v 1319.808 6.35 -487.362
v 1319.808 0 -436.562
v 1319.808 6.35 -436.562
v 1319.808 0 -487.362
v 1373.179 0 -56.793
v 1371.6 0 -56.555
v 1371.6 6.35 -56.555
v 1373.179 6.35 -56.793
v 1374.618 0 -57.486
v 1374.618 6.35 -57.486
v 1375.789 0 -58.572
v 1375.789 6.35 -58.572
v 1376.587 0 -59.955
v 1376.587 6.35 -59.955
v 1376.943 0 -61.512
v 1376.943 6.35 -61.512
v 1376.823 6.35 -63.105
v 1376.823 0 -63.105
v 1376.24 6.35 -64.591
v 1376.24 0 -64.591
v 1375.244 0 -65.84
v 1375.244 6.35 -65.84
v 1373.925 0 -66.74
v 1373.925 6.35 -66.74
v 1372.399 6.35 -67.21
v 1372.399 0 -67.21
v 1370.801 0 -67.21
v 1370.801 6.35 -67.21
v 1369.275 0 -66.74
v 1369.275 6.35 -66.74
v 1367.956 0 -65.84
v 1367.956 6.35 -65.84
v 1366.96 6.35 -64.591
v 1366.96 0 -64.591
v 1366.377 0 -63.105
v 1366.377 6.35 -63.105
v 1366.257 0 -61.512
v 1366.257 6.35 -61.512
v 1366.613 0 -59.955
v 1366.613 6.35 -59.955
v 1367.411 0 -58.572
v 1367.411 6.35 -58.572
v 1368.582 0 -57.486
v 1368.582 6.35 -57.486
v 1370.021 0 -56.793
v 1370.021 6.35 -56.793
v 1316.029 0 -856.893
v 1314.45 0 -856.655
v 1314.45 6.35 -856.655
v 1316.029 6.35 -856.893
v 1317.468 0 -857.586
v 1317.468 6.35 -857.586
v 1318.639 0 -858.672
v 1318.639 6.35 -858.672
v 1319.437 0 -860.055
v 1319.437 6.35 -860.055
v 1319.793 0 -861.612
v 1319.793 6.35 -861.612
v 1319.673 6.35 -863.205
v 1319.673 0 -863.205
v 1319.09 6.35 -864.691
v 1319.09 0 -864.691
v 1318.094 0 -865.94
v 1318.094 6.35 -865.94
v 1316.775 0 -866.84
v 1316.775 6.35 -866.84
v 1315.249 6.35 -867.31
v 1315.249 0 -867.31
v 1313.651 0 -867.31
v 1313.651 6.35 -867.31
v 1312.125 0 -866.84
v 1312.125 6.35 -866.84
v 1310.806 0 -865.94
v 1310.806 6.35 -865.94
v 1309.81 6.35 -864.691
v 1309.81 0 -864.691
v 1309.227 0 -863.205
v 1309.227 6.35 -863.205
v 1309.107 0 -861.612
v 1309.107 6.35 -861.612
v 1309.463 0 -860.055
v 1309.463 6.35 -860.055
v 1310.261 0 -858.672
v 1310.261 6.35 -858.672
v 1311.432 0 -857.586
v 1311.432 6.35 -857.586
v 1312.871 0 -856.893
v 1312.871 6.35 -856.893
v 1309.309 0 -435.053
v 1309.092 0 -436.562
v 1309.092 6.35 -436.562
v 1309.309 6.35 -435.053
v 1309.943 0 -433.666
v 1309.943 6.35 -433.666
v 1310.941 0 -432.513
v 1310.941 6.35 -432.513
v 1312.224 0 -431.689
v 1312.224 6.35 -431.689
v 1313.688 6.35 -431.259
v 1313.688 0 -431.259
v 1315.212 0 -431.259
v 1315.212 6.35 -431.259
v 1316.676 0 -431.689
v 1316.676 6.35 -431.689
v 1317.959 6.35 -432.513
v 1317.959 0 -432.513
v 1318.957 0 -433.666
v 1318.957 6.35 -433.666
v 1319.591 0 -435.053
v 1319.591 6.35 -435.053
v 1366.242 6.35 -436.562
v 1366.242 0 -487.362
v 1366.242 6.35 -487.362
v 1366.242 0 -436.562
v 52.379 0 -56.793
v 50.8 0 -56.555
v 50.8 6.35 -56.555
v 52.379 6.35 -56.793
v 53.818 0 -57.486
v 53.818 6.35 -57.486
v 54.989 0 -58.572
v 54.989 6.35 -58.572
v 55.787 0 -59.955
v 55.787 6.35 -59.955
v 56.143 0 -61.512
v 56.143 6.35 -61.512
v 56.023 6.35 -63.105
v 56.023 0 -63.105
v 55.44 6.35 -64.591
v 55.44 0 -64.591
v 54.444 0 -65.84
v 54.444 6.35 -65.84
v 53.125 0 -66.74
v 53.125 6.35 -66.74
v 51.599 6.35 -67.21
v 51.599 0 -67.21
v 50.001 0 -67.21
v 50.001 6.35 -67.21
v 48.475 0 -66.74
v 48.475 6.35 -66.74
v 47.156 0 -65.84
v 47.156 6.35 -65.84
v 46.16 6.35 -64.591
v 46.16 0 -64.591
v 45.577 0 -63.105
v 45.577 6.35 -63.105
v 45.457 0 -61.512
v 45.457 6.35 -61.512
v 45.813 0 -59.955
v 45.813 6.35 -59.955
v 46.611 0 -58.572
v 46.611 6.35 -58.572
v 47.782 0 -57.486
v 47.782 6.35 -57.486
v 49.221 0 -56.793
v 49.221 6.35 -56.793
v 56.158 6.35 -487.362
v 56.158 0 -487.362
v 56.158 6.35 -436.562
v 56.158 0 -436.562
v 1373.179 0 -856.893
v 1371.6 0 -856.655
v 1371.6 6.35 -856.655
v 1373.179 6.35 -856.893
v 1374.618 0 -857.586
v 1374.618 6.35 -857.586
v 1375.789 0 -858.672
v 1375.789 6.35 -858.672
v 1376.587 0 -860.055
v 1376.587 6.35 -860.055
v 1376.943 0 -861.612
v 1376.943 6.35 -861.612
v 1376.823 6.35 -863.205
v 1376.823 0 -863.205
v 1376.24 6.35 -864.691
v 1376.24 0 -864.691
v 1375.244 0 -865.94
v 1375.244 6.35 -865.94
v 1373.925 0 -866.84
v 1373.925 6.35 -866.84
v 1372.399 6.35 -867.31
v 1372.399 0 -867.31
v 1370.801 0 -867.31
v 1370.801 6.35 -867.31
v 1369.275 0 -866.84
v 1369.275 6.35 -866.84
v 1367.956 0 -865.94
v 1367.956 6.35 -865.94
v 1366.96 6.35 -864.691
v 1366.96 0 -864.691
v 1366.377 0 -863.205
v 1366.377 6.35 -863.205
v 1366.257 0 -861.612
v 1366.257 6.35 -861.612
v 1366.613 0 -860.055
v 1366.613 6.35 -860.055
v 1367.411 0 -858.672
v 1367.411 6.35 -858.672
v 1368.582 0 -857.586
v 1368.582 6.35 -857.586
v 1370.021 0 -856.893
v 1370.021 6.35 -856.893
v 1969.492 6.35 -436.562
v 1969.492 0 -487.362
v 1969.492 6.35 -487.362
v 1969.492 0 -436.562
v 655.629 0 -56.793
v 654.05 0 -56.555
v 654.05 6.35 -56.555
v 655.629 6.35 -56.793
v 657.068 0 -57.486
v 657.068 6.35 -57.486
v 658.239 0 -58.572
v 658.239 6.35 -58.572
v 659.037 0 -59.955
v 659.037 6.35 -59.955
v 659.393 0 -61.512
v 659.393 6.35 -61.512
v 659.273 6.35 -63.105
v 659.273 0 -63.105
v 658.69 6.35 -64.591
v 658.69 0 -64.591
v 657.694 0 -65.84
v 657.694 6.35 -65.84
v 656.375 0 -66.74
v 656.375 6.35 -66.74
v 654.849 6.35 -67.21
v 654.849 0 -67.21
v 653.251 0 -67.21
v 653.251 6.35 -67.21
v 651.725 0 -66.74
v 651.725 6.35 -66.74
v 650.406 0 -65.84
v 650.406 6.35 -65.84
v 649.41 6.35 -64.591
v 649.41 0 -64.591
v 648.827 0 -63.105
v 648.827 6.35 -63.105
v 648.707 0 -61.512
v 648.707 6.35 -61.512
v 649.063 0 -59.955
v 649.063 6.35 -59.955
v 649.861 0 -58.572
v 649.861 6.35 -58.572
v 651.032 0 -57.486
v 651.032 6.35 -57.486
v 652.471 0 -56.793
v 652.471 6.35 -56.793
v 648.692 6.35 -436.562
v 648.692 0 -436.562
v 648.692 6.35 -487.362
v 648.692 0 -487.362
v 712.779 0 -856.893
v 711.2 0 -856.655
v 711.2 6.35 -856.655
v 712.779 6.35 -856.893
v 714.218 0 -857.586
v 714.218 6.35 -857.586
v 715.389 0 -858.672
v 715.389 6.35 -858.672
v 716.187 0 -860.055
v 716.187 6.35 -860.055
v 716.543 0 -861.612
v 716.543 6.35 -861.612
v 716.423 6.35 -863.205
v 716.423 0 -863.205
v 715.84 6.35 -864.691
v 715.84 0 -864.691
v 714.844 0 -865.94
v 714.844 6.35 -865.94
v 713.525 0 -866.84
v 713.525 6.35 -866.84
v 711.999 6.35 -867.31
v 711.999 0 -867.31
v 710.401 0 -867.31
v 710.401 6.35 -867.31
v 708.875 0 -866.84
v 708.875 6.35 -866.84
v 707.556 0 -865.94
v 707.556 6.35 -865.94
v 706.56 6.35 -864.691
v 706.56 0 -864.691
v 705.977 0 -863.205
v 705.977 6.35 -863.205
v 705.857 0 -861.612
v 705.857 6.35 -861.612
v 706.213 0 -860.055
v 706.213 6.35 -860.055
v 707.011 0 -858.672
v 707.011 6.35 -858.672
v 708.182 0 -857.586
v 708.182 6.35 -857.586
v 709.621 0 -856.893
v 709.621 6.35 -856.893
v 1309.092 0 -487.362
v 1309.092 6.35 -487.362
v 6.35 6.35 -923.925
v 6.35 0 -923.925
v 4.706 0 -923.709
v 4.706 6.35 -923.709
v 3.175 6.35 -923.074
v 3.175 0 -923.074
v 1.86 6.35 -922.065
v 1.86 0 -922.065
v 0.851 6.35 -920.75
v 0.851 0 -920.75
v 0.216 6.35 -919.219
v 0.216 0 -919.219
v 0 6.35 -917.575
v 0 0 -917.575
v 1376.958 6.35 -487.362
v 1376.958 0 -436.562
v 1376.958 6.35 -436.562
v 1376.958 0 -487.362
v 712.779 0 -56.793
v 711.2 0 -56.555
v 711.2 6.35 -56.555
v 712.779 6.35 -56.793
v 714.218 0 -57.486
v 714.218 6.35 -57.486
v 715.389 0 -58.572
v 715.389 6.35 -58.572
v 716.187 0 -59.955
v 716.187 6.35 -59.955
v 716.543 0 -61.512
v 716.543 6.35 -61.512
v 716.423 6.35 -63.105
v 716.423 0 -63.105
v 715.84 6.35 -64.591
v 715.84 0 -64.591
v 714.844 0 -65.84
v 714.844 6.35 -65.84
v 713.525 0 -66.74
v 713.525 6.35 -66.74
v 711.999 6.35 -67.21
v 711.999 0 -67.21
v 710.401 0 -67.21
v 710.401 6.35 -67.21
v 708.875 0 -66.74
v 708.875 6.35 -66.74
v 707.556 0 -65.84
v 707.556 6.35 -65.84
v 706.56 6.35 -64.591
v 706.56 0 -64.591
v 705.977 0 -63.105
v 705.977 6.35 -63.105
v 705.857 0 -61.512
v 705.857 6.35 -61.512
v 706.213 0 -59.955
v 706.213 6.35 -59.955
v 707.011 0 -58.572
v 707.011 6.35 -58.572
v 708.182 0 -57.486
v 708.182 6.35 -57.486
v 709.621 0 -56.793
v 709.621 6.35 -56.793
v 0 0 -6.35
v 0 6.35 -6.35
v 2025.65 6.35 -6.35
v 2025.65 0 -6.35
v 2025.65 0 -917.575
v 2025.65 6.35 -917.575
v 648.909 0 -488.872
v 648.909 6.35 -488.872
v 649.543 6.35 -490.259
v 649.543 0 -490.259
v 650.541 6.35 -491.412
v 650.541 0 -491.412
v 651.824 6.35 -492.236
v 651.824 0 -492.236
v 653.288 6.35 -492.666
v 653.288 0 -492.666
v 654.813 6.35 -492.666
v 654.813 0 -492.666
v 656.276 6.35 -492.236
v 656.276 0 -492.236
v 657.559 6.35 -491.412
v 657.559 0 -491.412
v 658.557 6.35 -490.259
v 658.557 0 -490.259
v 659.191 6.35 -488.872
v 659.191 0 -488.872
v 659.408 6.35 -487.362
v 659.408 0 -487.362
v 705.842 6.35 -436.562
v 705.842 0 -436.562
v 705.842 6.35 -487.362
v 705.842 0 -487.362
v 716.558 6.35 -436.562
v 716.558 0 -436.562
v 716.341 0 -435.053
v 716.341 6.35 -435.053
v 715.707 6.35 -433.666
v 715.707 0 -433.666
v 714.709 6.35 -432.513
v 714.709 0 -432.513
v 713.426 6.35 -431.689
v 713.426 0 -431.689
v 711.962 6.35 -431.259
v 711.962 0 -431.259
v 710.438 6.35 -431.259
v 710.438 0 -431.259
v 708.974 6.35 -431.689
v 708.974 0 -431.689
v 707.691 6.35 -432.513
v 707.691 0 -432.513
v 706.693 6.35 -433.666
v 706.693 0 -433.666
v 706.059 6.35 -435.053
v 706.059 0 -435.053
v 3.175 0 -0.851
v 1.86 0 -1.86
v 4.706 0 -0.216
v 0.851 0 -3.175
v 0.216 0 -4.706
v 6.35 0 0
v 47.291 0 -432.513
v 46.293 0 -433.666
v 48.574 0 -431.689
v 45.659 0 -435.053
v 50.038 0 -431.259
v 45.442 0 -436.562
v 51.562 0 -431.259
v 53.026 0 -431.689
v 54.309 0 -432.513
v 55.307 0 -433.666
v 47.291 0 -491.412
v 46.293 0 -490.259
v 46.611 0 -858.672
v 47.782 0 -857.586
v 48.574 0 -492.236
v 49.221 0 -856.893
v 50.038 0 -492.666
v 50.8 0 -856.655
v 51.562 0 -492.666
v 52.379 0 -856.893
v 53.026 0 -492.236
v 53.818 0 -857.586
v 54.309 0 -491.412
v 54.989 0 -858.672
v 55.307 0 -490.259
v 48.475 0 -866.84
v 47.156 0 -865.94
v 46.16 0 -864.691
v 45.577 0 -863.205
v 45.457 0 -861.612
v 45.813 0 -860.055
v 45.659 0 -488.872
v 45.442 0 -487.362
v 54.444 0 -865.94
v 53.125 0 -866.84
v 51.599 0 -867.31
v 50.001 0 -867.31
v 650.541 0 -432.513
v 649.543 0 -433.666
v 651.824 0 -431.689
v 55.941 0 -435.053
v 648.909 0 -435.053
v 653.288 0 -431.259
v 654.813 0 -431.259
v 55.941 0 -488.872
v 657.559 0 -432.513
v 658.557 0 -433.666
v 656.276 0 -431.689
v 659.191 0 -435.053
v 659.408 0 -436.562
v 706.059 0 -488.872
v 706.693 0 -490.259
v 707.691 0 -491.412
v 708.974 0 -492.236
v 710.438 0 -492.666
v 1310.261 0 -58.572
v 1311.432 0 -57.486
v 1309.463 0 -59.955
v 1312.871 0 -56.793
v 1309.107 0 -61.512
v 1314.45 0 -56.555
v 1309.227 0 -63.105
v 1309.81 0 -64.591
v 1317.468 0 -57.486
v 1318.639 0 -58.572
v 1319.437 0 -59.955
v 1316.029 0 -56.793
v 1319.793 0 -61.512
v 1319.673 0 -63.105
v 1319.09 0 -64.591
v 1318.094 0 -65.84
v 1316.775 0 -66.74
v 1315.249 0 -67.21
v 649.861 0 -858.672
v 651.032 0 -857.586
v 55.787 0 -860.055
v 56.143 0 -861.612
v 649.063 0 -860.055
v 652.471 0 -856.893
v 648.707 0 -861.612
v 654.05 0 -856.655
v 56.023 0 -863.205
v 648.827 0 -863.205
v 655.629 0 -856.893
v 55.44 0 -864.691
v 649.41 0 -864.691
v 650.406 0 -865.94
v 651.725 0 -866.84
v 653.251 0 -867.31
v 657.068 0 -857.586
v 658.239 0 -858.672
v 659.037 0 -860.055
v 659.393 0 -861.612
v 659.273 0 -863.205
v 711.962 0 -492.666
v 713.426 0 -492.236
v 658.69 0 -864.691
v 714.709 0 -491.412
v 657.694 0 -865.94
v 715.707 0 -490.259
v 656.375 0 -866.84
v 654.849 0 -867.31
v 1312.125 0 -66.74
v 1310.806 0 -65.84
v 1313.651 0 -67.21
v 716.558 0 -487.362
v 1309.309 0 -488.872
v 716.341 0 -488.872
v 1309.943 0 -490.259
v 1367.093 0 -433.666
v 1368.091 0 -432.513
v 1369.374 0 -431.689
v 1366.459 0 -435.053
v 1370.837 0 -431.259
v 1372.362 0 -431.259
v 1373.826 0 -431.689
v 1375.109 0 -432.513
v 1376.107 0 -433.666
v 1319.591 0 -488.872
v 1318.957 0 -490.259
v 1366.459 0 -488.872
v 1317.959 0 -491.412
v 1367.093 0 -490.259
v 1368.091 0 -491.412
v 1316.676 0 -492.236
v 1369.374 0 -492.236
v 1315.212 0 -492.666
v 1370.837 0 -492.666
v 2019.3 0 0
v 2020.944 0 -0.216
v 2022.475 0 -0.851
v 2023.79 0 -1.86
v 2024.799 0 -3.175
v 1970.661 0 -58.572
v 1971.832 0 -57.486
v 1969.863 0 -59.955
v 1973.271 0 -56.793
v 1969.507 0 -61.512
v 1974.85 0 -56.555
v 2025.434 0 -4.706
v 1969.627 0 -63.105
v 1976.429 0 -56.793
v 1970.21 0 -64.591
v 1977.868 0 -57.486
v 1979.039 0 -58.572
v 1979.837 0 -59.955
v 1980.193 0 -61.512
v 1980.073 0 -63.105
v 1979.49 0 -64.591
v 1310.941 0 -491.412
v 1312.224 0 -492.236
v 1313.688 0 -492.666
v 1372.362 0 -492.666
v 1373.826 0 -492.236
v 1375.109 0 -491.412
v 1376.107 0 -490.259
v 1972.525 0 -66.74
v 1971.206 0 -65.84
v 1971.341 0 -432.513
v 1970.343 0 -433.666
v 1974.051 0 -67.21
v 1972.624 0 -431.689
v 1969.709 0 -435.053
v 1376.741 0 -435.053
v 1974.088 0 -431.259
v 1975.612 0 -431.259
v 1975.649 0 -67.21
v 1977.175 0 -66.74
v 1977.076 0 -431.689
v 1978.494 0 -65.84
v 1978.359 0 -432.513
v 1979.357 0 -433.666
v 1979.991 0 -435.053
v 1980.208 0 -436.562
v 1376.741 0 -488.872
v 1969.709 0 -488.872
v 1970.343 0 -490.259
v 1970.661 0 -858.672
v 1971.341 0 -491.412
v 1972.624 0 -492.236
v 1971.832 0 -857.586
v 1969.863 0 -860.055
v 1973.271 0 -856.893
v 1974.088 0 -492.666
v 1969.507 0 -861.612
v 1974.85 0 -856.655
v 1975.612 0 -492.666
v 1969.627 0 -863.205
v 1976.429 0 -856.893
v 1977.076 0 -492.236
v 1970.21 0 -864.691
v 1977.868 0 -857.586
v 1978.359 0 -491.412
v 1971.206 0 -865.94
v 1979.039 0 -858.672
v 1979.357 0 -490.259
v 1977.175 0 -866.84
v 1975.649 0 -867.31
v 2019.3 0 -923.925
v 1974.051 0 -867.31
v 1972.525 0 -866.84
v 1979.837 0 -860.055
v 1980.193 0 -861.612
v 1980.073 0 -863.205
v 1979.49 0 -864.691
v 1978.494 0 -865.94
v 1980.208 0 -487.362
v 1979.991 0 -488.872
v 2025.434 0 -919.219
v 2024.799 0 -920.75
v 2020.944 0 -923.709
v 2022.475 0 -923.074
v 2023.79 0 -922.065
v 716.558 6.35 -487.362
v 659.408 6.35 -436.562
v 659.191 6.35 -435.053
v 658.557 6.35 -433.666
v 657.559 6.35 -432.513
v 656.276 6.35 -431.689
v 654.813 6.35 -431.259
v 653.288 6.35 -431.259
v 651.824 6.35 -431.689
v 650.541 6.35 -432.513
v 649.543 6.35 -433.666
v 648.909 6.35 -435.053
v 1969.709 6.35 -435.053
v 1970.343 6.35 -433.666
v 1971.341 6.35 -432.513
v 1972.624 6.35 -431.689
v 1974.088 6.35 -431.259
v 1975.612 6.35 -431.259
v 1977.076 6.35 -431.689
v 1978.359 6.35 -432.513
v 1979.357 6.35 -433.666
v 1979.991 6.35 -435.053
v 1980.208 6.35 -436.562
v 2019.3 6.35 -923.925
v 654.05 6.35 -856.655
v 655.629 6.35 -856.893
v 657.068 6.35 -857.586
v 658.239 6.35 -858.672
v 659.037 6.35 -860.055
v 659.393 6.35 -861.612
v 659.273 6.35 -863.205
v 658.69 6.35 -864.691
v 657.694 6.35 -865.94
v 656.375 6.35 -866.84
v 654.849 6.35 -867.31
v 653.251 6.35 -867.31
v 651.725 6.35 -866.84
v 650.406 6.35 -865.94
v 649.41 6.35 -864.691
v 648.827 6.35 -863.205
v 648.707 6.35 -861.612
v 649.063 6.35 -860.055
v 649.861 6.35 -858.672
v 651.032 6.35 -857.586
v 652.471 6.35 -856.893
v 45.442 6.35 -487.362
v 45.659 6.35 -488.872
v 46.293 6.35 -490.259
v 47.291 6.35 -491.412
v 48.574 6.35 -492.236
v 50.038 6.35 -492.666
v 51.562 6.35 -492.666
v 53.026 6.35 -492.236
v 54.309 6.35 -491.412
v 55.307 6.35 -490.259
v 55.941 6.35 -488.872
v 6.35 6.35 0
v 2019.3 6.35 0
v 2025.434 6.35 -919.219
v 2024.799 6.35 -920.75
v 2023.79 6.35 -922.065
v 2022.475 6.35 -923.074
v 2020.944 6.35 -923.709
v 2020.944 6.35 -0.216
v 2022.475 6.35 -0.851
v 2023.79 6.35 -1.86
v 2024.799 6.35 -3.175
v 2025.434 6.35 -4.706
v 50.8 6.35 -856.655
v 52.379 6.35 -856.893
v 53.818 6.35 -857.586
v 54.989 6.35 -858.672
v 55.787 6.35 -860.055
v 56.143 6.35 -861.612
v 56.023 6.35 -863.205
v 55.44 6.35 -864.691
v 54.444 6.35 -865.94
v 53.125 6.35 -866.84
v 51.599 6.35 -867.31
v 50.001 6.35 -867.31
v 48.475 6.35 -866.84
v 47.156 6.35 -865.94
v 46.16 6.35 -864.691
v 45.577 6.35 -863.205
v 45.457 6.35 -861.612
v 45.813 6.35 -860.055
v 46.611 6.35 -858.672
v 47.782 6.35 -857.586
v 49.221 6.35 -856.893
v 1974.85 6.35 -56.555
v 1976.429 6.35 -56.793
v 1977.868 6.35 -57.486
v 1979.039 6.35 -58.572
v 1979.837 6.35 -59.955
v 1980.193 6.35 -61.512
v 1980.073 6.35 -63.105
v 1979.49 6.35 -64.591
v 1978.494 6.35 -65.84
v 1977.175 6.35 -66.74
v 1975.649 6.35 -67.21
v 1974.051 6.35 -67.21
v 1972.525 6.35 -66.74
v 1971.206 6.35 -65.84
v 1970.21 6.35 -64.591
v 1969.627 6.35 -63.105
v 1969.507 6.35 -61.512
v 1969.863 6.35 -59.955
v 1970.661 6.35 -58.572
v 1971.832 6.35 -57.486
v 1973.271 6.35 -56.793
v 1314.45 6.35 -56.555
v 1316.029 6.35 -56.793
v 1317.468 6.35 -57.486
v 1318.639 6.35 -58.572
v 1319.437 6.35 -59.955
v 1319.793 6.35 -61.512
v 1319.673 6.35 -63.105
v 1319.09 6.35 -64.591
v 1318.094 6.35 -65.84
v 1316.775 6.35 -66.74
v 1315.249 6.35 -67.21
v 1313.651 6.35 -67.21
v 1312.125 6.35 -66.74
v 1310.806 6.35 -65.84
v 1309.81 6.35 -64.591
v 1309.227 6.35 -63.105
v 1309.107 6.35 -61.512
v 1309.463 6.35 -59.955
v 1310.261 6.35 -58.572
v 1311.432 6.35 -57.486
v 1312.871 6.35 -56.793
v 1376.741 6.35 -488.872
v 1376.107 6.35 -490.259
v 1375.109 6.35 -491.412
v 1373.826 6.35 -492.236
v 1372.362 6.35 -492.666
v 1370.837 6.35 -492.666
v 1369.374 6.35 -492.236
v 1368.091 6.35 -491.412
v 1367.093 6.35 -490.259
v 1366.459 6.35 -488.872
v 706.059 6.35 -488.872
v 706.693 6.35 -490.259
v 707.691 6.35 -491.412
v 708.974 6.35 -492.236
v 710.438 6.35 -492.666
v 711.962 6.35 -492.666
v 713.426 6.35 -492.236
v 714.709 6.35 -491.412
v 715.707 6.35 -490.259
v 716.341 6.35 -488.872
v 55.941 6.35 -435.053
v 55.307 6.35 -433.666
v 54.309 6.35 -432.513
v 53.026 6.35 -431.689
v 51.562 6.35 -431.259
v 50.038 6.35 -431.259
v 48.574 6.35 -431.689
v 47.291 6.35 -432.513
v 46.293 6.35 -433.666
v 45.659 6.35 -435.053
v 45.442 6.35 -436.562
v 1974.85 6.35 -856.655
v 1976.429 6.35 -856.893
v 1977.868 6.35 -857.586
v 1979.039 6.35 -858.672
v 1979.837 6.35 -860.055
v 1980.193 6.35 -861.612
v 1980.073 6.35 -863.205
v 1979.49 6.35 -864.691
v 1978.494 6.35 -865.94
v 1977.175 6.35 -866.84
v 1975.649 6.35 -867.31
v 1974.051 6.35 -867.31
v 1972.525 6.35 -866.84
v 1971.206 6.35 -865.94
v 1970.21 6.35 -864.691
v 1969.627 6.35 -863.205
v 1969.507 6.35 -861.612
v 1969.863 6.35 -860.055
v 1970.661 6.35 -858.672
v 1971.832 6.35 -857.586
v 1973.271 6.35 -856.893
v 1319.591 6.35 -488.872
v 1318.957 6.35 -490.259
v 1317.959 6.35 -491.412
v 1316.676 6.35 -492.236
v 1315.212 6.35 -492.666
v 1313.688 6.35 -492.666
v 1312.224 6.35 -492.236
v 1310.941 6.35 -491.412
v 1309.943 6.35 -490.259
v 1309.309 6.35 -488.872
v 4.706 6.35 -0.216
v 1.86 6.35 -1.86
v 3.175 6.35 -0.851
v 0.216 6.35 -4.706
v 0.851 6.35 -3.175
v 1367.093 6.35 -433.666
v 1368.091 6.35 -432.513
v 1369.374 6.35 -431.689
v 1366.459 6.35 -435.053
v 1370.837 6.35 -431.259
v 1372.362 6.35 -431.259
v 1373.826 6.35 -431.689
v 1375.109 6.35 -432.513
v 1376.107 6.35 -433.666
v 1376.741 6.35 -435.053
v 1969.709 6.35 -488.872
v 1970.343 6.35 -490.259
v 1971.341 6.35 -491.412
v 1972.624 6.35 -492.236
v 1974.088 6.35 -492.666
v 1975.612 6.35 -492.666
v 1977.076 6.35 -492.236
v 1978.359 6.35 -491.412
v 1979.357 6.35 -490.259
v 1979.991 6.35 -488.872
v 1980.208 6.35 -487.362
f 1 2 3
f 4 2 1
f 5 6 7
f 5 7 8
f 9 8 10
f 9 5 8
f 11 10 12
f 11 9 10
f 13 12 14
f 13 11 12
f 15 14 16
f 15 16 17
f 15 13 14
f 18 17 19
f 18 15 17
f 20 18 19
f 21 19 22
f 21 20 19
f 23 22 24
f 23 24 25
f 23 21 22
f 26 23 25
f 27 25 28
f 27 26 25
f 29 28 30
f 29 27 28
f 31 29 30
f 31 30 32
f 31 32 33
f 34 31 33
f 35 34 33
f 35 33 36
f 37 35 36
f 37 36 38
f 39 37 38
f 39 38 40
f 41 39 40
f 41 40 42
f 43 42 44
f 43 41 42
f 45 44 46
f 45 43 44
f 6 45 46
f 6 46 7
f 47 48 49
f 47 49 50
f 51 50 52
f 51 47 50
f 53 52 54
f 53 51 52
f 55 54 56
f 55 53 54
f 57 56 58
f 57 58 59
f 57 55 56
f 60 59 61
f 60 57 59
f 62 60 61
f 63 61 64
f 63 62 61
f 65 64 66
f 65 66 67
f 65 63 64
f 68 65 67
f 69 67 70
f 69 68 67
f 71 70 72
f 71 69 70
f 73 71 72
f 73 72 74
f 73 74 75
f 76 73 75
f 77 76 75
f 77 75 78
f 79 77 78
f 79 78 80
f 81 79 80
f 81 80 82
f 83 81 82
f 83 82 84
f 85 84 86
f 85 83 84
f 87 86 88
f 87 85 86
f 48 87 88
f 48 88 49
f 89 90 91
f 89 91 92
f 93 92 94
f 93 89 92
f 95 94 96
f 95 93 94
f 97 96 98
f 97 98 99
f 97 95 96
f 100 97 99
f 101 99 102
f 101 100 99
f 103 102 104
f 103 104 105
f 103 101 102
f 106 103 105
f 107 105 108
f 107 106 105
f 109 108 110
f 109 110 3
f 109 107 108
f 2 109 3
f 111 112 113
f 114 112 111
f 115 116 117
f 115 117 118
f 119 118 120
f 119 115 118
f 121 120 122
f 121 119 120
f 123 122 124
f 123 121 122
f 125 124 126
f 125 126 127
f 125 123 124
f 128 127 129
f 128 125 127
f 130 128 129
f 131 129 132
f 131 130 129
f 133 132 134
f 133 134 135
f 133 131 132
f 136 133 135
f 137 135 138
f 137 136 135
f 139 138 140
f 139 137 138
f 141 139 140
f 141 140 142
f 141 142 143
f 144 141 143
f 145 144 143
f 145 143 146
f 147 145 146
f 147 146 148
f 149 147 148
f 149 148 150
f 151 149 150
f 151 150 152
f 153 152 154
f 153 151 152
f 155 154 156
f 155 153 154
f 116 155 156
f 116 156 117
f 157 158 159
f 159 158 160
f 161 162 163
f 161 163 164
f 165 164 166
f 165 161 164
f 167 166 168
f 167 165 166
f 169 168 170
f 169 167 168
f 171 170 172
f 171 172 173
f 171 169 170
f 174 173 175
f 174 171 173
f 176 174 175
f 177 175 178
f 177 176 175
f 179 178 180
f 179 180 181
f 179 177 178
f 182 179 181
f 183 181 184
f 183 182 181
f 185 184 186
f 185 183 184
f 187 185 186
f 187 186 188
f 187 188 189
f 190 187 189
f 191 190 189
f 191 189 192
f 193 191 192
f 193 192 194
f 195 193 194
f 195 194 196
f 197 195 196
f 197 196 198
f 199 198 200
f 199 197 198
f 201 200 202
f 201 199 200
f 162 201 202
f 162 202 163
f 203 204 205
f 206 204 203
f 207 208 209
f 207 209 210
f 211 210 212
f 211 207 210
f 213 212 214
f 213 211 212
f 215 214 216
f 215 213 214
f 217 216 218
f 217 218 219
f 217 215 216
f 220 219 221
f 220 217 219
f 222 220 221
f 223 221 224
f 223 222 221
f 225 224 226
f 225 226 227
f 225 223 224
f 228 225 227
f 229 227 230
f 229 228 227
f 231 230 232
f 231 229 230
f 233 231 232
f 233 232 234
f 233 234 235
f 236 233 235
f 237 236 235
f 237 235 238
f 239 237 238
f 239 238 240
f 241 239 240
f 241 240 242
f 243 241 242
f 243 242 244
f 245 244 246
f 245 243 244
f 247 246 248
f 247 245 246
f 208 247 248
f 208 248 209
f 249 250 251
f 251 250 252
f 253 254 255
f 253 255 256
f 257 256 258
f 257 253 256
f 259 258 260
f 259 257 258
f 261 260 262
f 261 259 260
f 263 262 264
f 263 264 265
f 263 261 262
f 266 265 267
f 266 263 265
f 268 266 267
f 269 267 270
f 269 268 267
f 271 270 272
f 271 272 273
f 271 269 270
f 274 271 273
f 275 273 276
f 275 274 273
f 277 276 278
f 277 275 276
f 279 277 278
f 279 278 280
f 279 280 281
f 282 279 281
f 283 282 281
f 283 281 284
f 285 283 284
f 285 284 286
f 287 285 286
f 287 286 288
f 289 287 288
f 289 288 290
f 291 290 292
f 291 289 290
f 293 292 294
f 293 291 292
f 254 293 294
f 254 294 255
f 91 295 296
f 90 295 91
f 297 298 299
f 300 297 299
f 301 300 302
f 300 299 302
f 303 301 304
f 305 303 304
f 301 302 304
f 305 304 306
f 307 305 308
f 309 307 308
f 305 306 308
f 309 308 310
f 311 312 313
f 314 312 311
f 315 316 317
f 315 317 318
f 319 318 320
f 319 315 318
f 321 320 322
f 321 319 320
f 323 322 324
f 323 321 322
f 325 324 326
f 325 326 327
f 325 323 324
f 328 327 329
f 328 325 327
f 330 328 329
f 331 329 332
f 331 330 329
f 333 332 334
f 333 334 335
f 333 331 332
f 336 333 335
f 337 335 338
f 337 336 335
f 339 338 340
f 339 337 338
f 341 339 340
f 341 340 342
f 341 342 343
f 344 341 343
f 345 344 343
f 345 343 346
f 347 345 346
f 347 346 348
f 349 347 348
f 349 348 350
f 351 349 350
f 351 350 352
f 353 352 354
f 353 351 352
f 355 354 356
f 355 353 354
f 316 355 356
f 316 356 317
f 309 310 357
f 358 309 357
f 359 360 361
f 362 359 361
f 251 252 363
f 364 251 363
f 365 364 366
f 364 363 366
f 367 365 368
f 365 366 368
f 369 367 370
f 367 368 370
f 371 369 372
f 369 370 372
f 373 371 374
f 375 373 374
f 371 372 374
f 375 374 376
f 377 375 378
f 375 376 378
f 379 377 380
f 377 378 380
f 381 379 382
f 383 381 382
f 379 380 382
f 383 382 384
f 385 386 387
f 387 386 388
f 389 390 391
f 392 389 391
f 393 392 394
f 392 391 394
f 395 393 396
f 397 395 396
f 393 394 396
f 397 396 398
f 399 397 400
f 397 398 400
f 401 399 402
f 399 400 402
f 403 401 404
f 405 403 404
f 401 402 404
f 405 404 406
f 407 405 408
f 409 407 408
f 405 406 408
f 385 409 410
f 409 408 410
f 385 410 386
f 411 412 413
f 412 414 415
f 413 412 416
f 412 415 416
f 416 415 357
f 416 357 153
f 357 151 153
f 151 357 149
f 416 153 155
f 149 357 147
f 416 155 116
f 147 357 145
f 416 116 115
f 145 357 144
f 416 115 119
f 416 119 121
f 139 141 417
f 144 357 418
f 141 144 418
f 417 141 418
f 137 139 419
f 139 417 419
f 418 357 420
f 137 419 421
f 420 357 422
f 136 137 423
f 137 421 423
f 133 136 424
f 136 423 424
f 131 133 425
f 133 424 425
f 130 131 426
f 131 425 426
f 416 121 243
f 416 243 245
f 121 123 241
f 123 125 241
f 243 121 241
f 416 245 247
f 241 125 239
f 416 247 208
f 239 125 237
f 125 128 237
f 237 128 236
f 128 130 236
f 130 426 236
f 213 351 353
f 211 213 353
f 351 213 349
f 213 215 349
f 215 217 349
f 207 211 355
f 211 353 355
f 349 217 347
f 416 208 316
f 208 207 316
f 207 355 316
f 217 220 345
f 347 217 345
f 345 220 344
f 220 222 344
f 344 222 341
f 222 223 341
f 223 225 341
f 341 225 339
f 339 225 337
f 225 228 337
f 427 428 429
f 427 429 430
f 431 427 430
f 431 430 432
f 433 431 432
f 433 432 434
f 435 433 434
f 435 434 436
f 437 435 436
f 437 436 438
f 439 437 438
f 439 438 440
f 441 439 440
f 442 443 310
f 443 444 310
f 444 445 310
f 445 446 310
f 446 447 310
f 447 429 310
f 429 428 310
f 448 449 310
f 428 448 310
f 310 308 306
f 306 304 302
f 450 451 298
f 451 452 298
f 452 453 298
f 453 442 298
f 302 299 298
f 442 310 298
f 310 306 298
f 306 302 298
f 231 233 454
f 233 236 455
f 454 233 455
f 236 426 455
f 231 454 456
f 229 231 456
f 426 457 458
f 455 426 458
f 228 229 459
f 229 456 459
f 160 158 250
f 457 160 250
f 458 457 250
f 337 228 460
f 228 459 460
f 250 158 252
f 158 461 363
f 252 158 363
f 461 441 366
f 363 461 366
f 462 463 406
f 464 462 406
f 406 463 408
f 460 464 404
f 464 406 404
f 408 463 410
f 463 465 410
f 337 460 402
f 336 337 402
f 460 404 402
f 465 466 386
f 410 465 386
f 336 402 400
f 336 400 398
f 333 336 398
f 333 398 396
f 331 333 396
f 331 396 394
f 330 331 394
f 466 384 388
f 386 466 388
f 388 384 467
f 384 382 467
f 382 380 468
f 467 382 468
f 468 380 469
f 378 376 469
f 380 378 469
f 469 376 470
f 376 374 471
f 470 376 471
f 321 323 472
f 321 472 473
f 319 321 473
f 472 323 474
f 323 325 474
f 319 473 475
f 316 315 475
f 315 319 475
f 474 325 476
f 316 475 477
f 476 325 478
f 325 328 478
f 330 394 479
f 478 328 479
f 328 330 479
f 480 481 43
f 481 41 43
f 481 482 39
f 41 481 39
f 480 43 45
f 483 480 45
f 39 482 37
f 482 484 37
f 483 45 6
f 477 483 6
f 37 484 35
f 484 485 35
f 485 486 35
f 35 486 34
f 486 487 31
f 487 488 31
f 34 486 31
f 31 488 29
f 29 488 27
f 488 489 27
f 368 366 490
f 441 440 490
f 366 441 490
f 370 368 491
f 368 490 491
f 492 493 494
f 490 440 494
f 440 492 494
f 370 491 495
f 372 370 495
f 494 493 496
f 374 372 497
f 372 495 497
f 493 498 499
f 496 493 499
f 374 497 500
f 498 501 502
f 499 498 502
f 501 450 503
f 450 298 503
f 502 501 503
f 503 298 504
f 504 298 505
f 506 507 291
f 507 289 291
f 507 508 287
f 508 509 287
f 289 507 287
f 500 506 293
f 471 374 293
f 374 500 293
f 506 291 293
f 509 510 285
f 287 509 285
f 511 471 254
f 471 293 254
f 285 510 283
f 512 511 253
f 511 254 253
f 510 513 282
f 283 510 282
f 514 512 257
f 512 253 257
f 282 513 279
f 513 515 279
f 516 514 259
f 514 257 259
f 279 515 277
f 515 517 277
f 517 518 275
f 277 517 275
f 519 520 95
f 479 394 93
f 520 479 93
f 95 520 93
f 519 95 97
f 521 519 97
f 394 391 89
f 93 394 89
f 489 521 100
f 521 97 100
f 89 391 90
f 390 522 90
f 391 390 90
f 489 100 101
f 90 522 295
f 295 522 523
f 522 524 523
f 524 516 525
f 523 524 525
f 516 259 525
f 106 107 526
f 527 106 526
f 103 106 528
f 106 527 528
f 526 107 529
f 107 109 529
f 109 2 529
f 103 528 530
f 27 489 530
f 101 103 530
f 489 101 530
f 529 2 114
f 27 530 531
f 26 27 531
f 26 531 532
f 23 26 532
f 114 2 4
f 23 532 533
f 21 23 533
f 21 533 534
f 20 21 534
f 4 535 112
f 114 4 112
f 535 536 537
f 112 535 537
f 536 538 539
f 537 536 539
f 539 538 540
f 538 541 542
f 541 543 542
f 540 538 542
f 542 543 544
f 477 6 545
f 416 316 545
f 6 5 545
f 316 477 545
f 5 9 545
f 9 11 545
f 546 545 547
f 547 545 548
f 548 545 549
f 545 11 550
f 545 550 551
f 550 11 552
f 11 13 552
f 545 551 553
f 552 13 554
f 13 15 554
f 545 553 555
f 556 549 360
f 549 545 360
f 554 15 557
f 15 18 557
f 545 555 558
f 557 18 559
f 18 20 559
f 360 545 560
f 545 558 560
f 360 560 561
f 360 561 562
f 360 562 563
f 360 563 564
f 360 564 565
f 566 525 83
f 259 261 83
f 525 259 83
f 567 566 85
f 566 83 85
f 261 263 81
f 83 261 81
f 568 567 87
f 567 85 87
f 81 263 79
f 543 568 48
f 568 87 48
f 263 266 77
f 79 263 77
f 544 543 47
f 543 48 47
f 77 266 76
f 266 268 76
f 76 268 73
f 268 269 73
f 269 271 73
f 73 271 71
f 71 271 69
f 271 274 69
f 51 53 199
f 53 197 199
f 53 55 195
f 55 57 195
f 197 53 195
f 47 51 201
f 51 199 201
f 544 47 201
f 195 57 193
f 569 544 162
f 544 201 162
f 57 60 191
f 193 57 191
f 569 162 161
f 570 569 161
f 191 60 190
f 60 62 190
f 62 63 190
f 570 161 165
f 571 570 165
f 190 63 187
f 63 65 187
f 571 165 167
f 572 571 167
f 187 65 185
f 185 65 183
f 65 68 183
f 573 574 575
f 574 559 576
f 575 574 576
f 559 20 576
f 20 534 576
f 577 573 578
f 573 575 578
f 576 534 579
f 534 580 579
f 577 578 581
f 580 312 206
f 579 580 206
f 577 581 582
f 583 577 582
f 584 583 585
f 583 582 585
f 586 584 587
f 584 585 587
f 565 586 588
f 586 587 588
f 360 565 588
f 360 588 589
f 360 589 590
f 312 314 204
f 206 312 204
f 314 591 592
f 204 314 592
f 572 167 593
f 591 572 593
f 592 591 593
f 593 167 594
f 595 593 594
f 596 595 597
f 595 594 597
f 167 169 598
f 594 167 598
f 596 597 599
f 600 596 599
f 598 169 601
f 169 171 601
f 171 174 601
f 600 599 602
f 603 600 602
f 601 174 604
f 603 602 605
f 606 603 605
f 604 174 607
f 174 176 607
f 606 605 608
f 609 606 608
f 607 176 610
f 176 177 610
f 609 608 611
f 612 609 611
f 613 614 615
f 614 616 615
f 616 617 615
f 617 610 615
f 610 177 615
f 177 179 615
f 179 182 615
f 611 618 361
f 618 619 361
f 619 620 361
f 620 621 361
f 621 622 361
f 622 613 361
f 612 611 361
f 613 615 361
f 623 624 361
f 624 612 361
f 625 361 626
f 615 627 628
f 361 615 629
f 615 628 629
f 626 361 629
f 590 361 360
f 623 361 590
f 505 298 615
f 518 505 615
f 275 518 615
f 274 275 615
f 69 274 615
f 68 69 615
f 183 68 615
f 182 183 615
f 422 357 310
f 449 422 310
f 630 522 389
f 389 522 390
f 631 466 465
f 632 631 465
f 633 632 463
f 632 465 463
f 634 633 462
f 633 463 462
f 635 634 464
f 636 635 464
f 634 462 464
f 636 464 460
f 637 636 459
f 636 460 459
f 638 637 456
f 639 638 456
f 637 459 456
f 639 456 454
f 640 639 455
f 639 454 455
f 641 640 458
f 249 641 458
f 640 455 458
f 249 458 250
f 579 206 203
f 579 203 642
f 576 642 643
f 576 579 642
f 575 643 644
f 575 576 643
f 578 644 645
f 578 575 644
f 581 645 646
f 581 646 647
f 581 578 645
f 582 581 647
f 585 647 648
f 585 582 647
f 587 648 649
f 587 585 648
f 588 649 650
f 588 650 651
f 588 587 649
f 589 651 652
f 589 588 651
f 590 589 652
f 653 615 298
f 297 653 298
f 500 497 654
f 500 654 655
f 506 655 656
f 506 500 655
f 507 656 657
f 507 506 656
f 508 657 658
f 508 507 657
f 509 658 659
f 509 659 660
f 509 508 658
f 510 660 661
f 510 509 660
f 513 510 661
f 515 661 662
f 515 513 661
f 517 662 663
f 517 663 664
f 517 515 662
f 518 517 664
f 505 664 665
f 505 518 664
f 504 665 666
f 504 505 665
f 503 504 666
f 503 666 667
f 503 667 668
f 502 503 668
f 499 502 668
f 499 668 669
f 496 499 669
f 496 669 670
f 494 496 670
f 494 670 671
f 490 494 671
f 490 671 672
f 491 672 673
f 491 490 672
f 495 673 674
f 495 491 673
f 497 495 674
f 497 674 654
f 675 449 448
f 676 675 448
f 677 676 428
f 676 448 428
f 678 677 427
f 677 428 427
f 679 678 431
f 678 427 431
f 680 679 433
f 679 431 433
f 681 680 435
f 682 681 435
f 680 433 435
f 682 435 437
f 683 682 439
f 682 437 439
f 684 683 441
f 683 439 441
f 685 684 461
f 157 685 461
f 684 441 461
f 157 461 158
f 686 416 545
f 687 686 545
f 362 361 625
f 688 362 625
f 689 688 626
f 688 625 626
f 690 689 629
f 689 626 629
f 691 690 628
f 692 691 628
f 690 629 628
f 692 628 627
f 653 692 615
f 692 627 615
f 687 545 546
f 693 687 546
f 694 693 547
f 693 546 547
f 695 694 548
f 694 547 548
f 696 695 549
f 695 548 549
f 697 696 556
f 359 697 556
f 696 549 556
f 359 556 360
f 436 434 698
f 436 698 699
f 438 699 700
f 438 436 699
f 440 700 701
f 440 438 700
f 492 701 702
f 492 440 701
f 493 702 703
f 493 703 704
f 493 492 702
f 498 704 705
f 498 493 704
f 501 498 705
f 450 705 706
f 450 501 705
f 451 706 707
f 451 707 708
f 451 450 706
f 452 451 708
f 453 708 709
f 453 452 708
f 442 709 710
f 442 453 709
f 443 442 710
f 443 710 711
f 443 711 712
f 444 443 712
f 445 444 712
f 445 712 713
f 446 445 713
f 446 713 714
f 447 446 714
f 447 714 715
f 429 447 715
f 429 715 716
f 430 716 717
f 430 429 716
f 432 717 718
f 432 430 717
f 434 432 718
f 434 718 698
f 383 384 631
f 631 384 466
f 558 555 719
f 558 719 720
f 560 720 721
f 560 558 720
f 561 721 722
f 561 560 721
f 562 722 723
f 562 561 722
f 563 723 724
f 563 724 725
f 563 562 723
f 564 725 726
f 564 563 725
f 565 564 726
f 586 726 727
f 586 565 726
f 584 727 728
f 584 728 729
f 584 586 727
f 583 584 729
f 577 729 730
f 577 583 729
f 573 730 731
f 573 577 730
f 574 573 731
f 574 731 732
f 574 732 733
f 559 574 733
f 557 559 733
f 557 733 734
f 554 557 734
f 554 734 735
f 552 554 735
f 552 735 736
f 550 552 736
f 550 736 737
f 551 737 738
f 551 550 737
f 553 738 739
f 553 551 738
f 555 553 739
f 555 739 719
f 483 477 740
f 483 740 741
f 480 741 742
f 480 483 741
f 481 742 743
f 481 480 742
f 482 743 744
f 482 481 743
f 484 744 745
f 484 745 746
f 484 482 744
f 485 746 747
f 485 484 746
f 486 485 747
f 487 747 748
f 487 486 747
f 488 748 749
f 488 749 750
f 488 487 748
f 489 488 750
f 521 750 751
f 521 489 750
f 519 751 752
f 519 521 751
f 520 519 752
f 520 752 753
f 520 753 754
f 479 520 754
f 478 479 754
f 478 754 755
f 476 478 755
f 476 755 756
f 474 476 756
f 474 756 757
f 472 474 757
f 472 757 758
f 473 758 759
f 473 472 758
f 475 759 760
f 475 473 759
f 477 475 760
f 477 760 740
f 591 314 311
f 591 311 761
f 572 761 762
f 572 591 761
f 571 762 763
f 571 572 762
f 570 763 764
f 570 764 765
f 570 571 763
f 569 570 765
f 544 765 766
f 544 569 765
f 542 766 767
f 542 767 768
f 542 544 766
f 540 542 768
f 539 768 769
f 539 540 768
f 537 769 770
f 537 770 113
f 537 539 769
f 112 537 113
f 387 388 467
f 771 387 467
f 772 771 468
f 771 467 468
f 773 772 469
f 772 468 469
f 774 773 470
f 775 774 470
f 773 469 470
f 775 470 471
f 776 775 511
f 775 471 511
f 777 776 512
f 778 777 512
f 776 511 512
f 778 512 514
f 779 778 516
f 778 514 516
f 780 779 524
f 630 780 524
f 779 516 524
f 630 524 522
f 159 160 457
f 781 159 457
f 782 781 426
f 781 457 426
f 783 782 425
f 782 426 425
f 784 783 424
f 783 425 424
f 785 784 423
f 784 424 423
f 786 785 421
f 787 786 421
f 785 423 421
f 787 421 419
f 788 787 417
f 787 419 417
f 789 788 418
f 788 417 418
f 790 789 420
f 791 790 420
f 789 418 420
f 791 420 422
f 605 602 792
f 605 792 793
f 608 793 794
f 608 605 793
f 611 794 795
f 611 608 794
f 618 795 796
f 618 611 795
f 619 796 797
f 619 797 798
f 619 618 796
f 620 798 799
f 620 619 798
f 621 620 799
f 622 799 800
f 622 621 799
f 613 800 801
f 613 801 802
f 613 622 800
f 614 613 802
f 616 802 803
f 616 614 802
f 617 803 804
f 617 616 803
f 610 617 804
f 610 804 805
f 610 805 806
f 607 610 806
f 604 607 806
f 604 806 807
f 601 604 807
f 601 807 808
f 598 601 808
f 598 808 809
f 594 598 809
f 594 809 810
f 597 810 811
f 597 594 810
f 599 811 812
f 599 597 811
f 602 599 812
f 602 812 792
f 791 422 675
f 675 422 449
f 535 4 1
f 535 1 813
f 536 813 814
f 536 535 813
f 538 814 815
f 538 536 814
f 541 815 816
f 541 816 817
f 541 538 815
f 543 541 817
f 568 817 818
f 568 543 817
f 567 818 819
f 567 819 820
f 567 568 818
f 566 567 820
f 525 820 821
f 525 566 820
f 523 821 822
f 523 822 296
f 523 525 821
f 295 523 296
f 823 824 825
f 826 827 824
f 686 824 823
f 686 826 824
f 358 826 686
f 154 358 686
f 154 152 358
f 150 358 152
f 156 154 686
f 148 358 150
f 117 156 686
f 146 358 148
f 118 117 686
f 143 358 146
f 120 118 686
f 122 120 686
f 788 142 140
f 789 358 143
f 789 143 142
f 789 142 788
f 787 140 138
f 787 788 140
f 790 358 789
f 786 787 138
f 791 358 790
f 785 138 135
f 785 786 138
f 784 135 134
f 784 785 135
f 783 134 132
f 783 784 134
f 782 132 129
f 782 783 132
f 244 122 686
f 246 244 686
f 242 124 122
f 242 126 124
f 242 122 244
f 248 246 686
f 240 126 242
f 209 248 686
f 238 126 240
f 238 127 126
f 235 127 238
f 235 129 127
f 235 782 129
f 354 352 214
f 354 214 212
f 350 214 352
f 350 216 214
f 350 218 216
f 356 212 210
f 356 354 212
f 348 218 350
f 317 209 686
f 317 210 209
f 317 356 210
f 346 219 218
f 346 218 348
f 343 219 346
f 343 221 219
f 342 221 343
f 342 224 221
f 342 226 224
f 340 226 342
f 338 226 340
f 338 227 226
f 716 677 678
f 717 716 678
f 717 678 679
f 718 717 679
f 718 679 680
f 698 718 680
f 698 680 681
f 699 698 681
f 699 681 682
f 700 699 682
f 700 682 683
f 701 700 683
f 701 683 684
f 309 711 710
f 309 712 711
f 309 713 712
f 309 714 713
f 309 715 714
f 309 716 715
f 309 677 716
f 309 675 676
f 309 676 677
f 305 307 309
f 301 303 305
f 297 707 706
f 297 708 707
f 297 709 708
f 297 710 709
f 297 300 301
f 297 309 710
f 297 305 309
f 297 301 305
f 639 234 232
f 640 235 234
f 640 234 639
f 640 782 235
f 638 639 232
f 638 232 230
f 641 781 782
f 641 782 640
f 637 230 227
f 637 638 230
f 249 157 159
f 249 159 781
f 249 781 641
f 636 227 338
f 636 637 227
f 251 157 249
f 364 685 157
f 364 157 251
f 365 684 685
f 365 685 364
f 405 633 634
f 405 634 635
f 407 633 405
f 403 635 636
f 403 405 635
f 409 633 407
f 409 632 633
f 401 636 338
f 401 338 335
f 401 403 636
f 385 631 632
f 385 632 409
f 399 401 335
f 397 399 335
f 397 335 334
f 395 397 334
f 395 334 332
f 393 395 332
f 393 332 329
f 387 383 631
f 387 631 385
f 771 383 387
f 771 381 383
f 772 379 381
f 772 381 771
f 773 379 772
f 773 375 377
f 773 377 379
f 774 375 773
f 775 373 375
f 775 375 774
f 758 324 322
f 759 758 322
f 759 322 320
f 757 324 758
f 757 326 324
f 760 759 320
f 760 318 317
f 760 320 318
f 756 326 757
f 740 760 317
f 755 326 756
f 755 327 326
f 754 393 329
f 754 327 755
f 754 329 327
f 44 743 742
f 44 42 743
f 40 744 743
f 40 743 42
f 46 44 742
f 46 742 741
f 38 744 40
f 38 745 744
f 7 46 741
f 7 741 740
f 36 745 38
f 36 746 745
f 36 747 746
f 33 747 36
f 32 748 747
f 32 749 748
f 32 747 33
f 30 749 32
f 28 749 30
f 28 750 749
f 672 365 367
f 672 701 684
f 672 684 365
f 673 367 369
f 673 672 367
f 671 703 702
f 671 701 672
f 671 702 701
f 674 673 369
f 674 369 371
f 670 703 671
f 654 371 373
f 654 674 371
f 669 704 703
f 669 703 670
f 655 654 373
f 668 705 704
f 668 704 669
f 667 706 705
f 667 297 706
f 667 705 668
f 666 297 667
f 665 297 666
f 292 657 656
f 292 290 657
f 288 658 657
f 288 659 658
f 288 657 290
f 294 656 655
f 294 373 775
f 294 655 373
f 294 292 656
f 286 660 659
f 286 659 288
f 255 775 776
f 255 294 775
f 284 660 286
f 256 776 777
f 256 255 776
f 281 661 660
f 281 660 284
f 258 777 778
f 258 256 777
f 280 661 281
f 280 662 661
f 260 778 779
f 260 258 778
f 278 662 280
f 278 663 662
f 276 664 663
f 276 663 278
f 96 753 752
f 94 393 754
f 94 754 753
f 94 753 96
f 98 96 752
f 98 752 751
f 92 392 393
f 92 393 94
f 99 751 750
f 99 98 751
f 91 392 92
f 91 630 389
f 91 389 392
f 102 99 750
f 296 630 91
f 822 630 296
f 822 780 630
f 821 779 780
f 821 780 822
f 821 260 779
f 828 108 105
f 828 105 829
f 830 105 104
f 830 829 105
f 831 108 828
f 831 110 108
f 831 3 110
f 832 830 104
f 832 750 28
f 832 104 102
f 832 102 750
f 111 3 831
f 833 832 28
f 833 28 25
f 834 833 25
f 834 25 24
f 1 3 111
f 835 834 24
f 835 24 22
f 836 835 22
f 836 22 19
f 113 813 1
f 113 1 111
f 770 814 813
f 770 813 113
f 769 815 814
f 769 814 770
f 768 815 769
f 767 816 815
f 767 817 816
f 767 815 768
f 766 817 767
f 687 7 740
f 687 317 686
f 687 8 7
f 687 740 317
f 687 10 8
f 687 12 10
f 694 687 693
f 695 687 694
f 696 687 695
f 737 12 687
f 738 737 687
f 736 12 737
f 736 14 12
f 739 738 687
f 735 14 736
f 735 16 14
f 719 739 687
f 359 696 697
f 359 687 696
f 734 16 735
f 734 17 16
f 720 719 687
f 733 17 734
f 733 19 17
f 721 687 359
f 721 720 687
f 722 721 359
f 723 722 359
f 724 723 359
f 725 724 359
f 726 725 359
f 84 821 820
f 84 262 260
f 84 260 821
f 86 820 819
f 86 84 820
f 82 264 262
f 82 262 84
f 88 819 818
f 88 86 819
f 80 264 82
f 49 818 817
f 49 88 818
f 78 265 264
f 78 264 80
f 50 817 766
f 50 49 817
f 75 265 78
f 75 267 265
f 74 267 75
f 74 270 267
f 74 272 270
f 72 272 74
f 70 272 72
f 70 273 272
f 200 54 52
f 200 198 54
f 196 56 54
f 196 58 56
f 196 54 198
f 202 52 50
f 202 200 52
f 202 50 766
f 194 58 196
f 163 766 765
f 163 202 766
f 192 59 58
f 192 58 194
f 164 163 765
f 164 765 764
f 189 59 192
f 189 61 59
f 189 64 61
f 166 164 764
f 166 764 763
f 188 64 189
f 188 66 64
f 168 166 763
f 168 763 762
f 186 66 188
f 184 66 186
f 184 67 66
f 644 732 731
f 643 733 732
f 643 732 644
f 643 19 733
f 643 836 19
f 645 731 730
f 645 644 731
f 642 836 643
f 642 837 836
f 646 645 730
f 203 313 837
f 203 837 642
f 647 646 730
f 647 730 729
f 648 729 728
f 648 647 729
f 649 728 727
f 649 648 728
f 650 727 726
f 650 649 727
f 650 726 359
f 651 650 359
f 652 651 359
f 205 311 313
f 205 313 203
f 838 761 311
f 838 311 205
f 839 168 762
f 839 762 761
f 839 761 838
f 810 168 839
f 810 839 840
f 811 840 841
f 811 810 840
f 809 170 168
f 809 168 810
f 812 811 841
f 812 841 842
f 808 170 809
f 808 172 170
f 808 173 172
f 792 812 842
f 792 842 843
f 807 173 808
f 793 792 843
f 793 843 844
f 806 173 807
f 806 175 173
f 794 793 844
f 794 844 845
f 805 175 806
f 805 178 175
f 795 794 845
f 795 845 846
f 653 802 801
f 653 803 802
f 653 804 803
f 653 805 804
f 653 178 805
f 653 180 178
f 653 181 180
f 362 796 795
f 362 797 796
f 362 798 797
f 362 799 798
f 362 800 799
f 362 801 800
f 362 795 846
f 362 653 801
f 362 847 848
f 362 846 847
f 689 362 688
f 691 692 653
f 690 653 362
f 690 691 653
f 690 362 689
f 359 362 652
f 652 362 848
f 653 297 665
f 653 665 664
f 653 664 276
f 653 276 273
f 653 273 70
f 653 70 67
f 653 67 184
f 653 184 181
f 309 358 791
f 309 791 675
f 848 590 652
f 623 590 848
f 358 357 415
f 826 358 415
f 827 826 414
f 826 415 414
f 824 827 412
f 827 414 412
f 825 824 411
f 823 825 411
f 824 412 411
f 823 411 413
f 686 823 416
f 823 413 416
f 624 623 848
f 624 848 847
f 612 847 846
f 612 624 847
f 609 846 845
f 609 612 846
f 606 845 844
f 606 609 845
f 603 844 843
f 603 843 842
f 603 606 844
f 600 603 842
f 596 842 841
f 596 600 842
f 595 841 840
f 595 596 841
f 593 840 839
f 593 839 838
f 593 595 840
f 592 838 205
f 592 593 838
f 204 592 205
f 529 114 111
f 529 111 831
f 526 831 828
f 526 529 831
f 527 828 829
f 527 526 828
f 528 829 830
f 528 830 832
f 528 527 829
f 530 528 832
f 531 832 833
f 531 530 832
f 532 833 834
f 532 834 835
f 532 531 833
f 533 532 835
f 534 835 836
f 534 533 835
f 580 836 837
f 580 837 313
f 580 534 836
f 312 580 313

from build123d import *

# Parameters (mm, degrees)
SKETCH1_R           = 5.3578125
BOSS_EXTRUDE1_DEPTH = 6.35


with BuildPart() as part:
    # Sketch1 → Boss-Extrude1 (new body)
    with BuildSketch(Plane(origin=(0, 0, 0), x_dir=(1, 0, 0), z_dir=(0, 1, 0))):
        with BuildLine():
            Line((6.35, 0), (2019.3, 0))
            ThreePointArc((2019.3, 0), (2023.790128061, 1.859871939), (2025.65, 6.35))
            Line((2025.65, 6.35), (2025.65, 917.575))
            ThreePointArc((2025.65, 917.575), (2023.790128061, 922.065128061), (2019.3, 923.925))
            Line((2019.3, 923.925), (6.35, 923.925))
            ThreePointArc((6.35, 923.925), (1.859871939, 922.065128061), (0, 917.575))
            Line((0, 917.575), (0, 6.35))
            ThreePointArc((0, 6.35), (1.859871939, 1.859871939), (6.35, 0))
        make_face()
        with Locations(Location((50.8, 862.0125, 0), (0, 0, 270))):
            Circle(SKETCH1_R, mode=Mode.SUBTRACT)
        with Locations(Location((1974.85, 862.0125, 0), (0, 0, 270))):
            Circle(SKETCH1_R, mode=Mode.SUBTRACT)
        with Locations(Location((1974.85, 61.9125, 0), (0, 0, 270))):
            Circle(SKETCH1_R, mode=Mode.SUBTRACT)
        with Locations(Location((50.8, 61.9125, 0), (0, 0, 270))):
            Circle(SKETCH1_R, mode=Mode.SUBTRACT)
        with Locations(Location((654.05, 862.0125, 0), (0, 0, 270))):
            Circle(SKETCH1_R, mode=Mode.SUBTRACT)
        with Locations(Location((1371.6, 862.0125, 0), (0, 0, 270))):
            Circle(SKETCH1_R, mode=Mode.SUBTRACT)
        with Locations(Location((711.2, 862.0125, 0), (0, 0, 270))):
            Circle(SKETCH1_R, mode=Mode.SUBTRACT)
        with Locations(Location((711.2, 61.9125, 0), (0, 0, 270))):
            Circle(SKETCH1_R, mode=Mode.SUBTRACT)
        with Locations(Location((654.05, 61.9125, 0), (0, 0, 270))):
            Circle(SKETCH1_R, mode=Mode.SUBTRACT)
        with Locations(Location((1314.45, 862.0125, 0), (0, 0, 270))):
            Circle(SKETCH1_R, mode=Mode.SUBTRACT)
        with Locations(Location((1314.45, 61.9125, 0), (0, 0, 270))):
            Circle(SKETCH1_R, mode=Mode.SUBTRACT)
        with Locations(Location((1371.6, 61.9125, 0), (0, 0, 270))):
            Circle(SKETCH1_R, mode=Mode.SUBTRACT)
        with BuildLine():
            Line((56.1578125, 487.3625), (56.1578125, 436.5625))
            ThreePointArc((56.1578125, 436.5625), (50.8, 431.2046875), (45.4421875, 436.5625))
            Line((45.4421875, 436.5625), (45.4421875, 487.3625))
            ThreePointArc((45.4421875, 487.3625), (50.8, 492.7203125), (56.1578125, 487.3625))
        make_face(mode=Mode.SUBTRACT)
        with BuildLine():
            Line((659.407827246, 487.3625), (659.407827246, 436.5625))
            ThreePointArc((659.407827246, 436.5625), (654.050014746, 431.2046875), (648.692202246, 436.5625))
            Line((648.692202246, 436.5625), (648.692202246, 487.3625))
            ThreePointArc((648.692202246, 487.3625), (654.050014746, 492.7203125), (659.407827246, 487.3625))
        make_face(mode=Mode.SUBTRACT)
        with BuildLine():
            Line((716.5578125, 487.3625), (716.5578125, 436.5625))
            ThreePointArc((716.5578125, 436.5625), (711.2, 431.2046875), (705.8421875, 436.5625))
            Line((705.8421875, 436.5625), (705.8421875, 487.3625))
            ThreePointArc((705.8421875, 487.3625), (711.2, 492.7203125), (716.5578125, 487.3625))
        make_face(mode=Mode.SUBTRACT)
        with BuildLine():
            Line((1969.4921875, 487.3625), (1969.4921875, 436.5625))
            ThreePointArc((1969.4921875, 436.5625), (1974.85, 431.2046875), (1980.2078125, 436.5625))
            Line((1980.2078125, 436.5625), (1980.2078125, 487.3625))
            ThreePointArc((1980.2078125, 487.3625), (1974.85, 492.7203125), (1969.4921875, 487.3625))
        make_face(mode=Mode.SUBTRACT)
        with BuildLine():
            Line((1309.0921875, 487.3625), (1309.0921875, 436.5625))
            ThreePointArc((1309.0921875, 436.5625), (1314.45, 431.2046875), (1319.8078125, 436.5625))
            Line((1319.8078125, 436.5625), (1319.8078125, 487.3625))
            ThreePointArc((1319.8078125, 487.3625), (1314.45, 492.7203125), (1309.0921875, 487.3625))
        make_face(mode=Mode.SUBTRACT)
        with BuildLine():
            Line((1366.242172754, 487.3625), (1366.242172754, 436.5625))
            ThreePointArc((1366.242172754, 436.5625), (1371.599985254, 431.2046875), (1376.957797754, 436.5625))
            Line((1376.957797754, 436.5625), (1376.957797754, 487.3625))
            ThreePointArc((1376.957797754, 487.3625), (1371.599985254, 492.7203125), (1366.242172754, 487.3625))
        make_face(mode=Mode.SUBTRACT)
    extrude(amount=BOSS_EXTRUDE1_DEPTH)


solid = part.part
